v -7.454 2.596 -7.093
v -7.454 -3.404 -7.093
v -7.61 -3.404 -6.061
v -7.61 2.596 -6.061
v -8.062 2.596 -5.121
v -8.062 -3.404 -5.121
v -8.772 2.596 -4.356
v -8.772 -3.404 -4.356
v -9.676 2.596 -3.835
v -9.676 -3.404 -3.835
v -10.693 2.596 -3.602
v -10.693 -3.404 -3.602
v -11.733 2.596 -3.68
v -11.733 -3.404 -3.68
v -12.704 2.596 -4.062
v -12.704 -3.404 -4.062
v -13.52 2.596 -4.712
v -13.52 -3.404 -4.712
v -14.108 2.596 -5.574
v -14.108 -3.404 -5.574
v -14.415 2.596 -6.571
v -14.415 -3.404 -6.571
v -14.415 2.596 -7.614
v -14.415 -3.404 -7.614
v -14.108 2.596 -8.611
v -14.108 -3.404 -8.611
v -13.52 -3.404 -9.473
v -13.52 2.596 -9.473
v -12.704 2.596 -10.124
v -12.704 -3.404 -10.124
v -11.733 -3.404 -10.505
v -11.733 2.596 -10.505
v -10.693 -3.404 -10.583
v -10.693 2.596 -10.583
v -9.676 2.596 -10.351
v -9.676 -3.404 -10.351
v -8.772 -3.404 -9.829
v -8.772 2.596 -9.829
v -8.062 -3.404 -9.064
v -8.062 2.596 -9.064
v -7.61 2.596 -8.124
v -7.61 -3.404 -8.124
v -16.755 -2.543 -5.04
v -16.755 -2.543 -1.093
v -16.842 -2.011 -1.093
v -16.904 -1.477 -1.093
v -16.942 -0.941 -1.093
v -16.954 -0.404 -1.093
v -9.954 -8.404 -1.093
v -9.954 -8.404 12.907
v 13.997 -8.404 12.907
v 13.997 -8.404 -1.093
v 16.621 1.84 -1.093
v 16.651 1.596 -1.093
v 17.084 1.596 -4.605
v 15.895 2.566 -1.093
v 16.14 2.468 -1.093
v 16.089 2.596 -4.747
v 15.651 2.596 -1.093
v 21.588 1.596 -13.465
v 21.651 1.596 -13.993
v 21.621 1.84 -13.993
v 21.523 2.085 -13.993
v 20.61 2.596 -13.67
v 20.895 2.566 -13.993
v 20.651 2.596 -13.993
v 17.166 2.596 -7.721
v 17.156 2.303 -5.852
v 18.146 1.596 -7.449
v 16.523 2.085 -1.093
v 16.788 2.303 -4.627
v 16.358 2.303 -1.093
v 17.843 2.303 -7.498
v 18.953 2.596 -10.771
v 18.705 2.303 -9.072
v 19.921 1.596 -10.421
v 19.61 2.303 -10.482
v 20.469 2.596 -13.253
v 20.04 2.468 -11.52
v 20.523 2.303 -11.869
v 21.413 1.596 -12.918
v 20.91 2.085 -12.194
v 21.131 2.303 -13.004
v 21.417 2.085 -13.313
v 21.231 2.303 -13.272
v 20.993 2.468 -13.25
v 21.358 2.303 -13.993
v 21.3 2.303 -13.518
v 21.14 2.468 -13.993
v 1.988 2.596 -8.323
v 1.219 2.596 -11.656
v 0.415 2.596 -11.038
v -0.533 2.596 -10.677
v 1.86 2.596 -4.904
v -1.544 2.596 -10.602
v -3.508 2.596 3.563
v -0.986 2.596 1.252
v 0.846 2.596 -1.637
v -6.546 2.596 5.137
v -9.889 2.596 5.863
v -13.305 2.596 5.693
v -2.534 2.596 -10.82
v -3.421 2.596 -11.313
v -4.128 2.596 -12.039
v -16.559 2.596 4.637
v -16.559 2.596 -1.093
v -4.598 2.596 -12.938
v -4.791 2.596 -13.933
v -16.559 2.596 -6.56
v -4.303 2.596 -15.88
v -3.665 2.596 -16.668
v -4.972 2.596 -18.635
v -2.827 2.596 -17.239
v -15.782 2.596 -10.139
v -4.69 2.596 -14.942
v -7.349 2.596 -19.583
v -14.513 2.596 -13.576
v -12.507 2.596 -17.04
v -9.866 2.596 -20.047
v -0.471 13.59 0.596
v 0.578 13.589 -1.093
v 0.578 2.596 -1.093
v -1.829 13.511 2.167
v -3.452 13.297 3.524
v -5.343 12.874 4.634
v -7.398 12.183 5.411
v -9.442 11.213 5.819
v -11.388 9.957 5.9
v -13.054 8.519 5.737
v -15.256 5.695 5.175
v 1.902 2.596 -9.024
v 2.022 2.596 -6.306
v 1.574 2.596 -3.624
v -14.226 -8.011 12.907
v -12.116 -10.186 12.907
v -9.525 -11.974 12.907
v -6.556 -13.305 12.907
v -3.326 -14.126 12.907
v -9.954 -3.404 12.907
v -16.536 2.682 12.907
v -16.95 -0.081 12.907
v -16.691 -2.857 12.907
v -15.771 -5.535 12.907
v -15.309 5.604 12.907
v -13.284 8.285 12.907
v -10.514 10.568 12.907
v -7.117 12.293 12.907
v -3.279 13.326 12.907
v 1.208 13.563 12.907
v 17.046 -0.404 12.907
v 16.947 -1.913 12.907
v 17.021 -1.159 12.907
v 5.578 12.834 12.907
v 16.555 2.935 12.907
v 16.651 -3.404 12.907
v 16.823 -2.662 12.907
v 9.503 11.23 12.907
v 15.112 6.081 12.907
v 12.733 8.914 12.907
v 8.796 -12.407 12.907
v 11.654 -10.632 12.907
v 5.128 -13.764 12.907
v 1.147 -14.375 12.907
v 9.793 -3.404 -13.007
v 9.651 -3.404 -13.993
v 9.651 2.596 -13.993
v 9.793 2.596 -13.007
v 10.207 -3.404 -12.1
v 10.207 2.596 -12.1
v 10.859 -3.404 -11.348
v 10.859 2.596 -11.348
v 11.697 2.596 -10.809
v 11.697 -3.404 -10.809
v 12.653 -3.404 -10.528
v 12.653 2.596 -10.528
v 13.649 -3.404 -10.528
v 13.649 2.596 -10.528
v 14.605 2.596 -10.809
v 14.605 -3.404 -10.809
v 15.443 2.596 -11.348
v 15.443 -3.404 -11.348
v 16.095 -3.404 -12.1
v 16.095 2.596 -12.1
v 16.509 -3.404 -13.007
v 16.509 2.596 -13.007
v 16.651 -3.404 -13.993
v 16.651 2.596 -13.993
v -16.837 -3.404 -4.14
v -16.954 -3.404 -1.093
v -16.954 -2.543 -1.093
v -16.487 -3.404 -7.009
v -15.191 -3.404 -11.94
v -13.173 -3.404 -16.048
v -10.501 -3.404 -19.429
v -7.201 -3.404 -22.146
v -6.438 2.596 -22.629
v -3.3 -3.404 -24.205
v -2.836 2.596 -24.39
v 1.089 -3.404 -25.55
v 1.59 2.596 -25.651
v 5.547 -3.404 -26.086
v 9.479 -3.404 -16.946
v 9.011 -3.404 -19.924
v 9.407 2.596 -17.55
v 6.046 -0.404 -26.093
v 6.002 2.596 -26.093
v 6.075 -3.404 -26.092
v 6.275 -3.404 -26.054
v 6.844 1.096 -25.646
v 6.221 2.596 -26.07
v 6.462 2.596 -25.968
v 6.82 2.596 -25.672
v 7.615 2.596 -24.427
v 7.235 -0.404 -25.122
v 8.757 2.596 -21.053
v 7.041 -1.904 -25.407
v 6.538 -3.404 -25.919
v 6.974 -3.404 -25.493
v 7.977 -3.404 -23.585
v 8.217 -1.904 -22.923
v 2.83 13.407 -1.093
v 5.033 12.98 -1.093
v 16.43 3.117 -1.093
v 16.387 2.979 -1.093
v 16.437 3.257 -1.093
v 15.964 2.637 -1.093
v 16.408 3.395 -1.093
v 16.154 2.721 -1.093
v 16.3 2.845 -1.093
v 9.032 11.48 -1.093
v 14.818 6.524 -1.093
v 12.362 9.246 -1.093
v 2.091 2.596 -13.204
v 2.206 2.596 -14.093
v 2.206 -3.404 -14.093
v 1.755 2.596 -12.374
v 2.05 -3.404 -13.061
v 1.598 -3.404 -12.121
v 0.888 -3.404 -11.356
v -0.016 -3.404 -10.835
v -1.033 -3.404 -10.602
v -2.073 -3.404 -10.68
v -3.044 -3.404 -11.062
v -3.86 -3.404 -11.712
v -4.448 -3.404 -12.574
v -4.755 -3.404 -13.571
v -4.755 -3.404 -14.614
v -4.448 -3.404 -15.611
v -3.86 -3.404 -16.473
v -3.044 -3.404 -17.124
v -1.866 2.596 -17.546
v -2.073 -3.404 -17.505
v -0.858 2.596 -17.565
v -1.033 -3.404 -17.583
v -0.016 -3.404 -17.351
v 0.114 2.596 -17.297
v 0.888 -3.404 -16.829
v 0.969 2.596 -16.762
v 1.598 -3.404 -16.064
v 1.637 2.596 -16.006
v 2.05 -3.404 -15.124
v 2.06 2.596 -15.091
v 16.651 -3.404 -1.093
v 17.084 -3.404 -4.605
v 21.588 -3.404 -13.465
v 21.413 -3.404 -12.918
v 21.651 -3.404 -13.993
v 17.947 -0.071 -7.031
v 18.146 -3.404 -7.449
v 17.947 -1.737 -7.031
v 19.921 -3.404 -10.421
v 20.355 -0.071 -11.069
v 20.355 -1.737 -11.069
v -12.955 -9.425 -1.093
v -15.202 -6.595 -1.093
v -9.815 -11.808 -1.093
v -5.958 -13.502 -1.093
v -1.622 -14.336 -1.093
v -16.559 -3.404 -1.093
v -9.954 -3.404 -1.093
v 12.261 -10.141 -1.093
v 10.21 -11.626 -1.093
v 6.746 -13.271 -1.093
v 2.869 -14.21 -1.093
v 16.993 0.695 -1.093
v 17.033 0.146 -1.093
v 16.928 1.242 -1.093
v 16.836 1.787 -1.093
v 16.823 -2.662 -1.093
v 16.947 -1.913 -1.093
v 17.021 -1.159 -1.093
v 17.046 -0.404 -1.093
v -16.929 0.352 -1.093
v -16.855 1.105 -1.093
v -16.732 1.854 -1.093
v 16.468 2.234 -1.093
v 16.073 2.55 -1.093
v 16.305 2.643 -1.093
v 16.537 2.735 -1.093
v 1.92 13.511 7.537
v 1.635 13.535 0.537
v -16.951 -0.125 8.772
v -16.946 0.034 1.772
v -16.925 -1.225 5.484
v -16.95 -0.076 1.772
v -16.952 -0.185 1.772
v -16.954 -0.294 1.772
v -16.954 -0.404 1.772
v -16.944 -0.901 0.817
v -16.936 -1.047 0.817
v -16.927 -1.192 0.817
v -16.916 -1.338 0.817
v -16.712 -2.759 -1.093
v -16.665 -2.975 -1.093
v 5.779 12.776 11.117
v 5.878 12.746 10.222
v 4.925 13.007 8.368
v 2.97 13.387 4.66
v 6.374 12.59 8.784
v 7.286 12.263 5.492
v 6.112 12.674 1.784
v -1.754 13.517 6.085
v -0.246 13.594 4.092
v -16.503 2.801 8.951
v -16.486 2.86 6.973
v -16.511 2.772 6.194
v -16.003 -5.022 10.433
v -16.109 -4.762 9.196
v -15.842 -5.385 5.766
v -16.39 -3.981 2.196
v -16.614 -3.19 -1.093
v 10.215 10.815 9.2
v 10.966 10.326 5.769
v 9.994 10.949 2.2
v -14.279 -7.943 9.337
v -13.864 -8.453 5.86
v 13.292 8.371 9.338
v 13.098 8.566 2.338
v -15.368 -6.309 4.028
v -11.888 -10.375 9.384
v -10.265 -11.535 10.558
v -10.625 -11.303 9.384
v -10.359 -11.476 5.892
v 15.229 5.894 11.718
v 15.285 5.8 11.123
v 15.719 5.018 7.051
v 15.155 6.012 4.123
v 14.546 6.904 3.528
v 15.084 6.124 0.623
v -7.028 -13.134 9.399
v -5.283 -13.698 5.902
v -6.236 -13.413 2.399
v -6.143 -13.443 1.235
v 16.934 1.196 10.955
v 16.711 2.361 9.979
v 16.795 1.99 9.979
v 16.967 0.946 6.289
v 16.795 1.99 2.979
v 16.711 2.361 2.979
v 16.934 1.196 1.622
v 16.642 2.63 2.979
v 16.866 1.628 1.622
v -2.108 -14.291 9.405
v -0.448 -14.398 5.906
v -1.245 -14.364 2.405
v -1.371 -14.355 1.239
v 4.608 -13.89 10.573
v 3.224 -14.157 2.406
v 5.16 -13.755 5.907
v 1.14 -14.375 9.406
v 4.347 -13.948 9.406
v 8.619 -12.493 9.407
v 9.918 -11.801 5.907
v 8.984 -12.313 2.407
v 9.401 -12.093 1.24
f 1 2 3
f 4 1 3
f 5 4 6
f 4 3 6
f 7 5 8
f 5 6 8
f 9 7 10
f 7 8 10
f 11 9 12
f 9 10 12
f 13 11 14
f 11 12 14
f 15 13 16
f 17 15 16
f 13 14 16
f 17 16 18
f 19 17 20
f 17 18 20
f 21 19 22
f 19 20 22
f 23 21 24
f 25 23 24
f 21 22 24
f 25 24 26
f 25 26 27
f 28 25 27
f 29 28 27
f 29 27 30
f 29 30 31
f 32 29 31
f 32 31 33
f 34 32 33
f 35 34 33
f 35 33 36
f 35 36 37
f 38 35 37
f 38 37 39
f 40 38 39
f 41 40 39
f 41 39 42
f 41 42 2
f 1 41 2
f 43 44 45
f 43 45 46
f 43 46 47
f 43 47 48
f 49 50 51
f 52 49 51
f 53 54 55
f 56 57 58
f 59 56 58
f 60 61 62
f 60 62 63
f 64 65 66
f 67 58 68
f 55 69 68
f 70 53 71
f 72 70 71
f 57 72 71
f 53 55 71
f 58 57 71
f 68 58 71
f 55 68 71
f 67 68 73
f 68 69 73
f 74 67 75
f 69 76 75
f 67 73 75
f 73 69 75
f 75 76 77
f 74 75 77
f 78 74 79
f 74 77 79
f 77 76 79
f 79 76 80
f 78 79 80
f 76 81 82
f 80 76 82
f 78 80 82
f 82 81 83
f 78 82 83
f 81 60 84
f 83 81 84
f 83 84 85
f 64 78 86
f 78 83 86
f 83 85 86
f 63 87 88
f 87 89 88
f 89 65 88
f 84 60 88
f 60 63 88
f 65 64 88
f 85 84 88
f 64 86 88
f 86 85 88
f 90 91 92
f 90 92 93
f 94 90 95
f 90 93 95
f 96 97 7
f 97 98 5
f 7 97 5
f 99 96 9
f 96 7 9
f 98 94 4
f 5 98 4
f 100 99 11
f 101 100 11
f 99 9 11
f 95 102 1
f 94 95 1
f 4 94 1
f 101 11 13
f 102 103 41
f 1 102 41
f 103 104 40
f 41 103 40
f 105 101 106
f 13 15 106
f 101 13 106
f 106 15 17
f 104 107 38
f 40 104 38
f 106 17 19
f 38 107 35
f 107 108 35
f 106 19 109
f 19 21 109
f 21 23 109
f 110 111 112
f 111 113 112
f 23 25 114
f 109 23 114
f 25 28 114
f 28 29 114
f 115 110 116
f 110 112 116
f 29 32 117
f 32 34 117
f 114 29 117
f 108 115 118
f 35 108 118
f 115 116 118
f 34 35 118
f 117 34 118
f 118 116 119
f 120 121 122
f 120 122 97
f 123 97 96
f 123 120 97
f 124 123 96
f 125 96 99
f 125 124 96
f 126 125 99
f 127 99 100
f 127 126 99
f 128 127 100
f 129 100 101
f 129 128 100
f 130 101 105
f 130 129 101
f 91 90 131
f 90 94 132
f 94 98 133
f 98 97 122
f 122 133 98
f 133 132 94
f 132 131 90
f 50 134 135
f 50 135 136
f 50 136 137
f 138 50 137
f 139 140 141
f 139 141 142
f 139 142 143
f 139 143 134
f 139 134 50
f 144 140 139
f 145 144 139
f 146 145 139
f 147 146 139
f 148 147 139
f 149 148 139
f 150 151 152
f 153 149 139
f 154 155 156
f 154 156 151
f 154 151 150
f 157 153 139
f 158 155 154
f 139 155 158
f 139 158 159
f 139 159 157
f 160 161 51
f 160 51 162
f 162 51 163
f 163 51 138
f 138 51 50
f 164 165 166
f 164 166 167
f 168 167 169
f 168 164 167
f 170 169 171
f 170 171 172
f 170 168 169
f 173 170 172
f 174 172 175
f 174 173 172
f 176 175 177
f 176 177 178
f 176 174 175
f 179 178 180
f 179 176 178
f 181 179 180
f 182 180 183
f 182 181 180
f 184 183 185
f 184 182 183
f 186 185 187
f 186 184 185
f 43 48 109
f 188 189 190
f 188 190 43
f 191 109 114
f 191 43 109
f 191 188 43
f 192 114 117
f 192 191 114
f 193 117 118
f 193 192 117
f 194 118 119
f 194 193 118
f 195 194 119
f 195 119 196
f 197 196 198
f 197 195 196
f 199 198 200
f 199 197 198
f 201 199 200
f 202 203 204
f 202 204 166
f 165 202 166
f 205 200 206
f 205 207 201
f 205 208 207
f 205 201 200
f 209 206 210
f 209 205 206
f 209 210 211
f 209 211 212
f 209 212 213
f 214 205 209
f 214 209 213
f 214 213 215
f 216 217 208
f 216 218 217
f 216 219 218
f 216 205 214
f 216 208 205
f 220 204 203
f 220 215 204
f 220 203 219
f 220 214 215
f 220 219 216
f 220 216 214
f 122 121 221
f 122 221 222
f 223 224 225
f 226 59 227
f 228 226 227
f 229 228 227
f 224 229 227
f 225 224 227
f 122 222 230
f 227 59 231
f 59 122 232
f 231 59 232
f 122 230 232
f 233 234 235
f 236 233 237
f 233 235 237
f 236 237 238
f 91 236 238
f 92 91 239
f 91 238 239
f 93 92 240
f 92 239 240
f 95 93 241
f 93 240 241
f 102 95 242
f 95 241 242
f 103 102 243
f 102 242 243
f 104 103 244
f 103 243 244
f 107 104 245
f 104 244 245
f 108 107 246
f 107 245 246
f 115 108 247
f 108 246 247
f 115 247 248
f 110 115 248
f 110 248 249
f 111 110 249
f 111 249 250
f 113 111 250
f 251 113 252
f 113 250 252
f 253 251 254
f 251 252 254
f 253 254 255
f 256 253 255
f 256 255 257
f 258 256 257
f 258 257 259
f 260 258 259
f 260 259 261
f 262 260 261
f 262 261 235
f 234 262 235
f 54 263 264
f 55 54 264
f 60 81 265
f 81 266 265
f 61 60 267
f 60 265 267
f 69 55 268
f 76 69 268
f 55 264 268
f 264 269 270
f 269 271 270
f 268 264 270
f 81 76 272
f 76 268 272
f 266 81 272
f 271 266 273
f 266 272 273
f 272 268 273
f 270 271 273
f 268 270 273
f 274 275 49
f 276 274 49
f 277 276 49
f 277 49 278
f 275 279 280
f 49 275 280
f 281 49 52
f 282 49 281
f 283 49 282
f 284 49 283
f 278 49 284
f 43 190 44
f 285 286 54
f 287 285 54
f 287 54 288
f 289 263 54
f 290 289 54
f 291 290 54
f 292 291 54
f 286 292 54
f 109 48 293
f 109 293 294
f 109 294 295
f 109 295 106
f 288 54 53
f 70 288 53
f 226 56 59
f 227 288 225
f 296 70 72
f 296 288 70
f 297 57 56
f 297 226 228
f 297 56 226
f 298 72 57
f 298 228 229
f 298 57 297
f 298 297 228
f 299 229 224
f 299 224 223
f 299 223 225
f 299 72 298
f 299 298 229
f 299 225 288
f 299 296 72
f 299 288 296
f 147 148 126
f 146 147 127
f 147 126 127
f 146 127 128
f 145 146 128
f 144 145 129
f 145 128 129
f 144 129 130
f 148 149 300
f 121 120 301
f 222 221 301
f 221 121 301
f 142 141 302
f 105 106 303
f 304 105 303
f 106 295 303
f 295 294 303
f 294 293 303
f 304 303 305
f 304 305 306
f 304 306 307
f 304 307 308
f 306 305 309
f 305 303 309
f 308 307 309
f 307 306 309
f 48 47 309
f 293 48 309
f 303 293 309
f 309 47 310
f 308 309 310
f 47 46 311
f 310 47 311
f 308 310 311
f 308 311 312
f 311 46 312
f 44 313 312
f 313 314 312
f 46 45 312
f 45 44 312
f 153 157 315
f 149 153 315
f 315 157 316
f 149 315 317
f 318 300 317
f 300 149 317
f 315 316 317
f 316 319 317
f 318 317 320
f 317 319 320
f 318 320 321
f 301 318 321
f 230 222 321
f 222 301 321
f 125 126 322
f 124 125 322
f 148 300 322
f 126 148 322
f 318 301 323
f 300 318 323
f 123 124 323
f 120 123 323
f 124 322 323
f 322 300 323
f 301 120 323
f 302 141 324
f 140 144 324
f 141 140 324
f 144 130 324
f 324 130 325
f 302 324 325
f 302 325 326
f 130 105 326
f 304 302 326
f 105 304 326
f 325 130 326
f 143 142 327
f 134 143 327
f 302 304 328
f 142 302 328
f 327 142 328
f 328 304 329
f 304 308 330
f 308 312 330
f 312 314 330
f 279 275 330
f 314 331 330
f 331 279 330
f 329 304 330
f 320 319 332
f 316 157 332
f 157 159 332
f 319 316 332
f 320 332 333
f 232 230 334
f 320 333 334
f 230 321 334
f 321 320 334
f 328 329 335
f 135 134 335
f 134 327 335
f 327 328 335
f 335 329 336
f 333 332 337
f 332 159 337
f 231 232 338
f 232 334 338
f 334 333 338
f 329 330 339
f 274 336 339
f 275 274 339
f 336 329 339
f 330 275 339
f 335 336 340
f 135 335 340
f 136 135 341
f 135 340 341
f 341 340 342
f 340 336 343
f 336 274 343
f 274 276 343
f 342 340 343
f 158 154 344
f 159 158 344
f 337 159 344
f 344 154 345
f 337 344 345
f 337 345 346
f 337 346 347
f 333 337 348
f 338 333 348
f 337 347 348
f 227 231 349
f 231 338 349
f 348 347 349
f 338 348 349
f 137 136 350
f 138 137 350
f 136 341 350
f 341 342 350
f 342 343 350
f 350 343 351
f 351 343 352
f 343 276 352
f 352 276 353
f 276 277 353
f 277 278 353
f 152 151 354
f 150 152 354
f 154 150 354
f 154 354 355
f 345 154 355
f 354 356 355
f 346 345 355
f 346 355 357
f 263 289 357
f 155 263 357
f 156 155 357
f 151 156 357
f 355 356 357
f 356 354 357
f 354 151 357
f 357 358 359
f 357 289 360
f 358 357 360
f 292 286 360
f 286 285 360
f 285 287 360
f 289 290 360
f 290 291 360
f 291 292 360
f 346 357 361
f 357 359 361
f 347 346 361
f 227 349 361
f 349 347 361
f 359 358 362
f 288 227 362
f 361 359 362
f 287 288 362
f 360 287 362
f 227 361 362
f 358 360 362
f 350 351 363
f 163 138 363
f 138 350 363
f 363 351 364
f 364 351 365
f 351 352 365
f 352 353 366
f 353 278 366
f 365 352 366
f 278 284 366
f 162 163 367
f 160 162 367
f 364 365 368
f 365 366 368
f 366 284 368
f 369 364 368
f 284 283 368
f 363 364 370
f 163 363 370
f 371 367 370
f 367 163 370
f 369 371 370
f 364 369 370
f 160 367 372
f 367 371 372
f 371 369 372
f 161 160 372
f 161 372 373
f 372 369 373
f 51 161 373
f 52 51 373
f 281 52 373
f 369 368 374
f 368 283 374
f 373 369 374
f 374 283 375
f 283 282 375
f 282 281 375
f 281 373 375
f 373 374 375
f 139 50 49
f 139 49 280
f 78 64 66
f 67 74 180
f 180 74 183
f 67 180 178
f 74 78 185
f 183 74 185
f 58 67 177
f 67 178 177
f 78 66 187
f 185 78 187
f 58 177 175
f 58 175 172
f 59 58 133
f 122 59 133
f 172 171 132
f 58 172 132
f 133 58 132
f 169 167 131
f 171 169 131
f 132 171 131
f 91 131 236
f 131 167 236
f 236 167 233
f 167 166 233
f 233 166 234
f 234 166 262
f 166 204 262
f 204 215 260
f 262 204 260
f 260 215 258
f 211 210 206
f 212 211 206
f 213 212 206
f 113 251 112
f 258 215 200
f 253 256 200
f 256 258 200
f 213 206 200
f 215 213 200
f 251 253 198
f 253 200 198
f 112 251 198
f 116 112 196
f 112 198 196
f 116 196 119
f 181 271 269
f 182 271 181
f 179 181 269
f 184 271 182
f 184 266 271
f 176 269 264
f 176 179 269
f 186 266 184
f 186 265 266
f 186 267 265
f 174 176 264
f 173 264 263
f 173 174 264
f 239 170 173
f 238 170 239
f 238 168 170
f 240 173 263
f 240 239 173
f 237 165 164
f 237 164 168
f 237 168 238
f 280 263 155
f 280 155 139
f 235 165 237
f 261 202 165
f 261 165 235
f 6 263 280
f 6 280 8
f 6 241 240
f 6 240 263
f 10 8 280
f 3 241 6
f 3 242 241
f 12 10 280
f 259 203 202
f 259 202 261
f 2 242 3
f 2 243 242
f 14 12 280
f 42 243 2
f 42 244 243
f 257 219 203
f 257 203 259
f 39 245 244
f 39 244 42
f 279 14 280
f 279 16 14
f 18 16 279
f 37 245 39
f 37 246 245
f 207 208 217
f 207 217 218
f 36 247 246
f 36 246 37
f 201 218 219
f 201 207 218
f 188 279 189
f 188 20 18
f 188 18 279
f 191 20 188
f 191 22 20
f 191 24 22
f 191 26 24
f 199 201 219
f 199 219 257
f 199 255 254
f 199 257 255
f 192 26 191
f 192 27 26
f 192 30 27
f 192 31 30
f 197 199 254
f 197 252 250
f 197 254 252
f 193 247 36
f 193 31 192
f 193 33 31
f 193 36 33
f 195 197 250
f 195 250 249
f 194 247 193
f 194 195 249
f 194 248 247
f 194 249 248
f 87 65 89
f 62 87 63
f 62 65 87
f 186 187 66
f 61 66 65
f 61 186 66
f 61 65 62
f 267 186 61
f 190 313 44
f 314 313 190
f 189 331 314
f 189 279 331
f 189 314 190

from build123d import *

# Parameters (mm, degrees)
SKETCH1_RX          = 8.5
SKETCH1_RY          = 7
BOSS_EXTRUDE1_DEPTH = 7
SKETCH3_W           = 13.302553701
SKETCH3_H           = 2.5
CUT_EXTRUDE1_DEPTH  = 7
SKETCH4_R           = 1.75
BOSS_EXTRUDE3_DEPTH = 3
CUT_EXTRUDE2_DEPTH  = 10
FILLET1_R           = 0.5
SCALE1_SCALE        = 2
SKETCH10_R          = 13
CUT_EXTRUDE3_DEPTH  = 11.904048595


with BuildPart() as part:
    # Sketch1 → Boss-Extrude1 (new body)
    with BuildSketch(Plane.XY):
        with Locations((0, 0)):
            Ellipse(SKETCH1_RX, SKETCH1_RY)
    extrude(amount=BOSS_EXTRUDE1_DEPTH)

    # Sketch3 → Cut-Extrude1 (cut)
    with BuildSketch(Plane.XY.offset(7)):
        with Locations((1.651276851, -2.75)):
            Rectangle(SKETCH3_W, SKETCH3_H)
    extrude(amount=-CUT_EXTRUDE1_DEPTH, mode=Mode.SUBTRACT)

    # Sketch4 → Boss-Extrude3 (add)
    with BuildSketch(Plane(origin=(0, -1.5, 0), x_dir=(-1, 0, 0), z_dir=(0, -1, 0))):
        with BuildLine():
            Line((-8.302553701, 6.45), (-10.802553701, 6.45))
            add(Edge.make_bspline(
                [(-8.302553701, 0), (-8.302553701, 3.575485031), (-10.802553701, 5.135257865), (-10.802553701, 6.45)],
                knots=[0, 0, 0, 0, 0.74548132, 0.74548132, 0.74548132, 0.74548132], degree=3))
            Line((-8.302553701, 0), (8.5, 0))
            add(Edge.make_bspline(
                [(8.5, 0), (8.5, 10.613387886), (0.460909778, 12.5), (-3, 12.5)],
                knots=[0, 0, 0, 0, 0.609858284, 0.609858284, 0.609858284, 0.609858284], degree=3))
            add(Edge.make_bspline(
                [(-4.802553701, 6.45), (-4.802553701, 9.055292156), (-3.876094367, 12.5), (-3, 12.5)],
                knots=[0, 0, 0, 0, 0.703518023, 0.703518023, 0.703518023, 0.703518023], degree=3))
            ThreePointArc((-4.802553701, 6.45), (-6.552553701, 4.7), (-8.302553701, 6.45))
        make_face()
        with Locations(Location((0.67, 6.5, 0), (0, 0, 180))):
            Circle(SKETCH4_R, mode=Mode.SUBTRACT)
        with Locations(Location((5.5, 3, 0), (0, 0, 180))):
            Circle(SKETCH4_R, mode=Mode.SUBTRACT)
    extrude(amount=-BOSS_EXTRUDE3_DEPTH)

    # Sketch5 → Cut-Extrude2 (cut)
    with BuildSketch(Plane(origin=(0, 0, 0), x_dir=(-1, 0, 0), z_dir=(0, 0, -1))):
        with BuildLine():
            Line((7.715910661, 2.936517276), (9.418477353, 2.936517276))
            Line((9.418477353, 2.936517276), (9.418477353, -1.069495705))
            Line((9.418477353, -1.069495705), (8.400205207, -1.069495705))
            add(Edge.make_bspline(
                [(8.400205207, -1.069495705), (8.79219322, 1.018558972), (7.715910661, 2.936517276)],
                knots=[6.129799457, 6.129799457, 6.129799457, 6.716082467, 6.716082467, 6.716082467], degree=2, weights=[1, 0.957340828, 1]))
        make_face()
    extrude(amount=CUT_EXTRUDE2_DEPTH, mode=Mode.SUBTRACT)

    # Fillet1
    fillet1_edges = [part.edges().sort_by_distance(p)[0] for p in [
        (9.151569491, 1.5, -3.377856468),
    ]]
    fillet(fillet1_edges, radius=FILLET1_R)


with BuildPart() as part_1:
    # Scale1: scaled about (-0.04579055, 0.403952777, 1.092664481)
    add(part.part.scale(SCALE1_SCALE).moved(Location((0.04579055, -0.403952777, -1.092664481))))

    # Sketch10 → Cut-Extrude3 (cut)
    with BuildSketch(Plane(origin=(0, 14.5, 0), x_dir=(-1, 0, 0), z_dir=(0, -1, 0))):
        with Locations((10.954106998, 7.092815549)):
            Circle(SKETCH10_R)
    extrude(amount=CUT_EXTRUDE3_DEPTH, mode=Mode.SUBTRACT)


solid = part_1.part
